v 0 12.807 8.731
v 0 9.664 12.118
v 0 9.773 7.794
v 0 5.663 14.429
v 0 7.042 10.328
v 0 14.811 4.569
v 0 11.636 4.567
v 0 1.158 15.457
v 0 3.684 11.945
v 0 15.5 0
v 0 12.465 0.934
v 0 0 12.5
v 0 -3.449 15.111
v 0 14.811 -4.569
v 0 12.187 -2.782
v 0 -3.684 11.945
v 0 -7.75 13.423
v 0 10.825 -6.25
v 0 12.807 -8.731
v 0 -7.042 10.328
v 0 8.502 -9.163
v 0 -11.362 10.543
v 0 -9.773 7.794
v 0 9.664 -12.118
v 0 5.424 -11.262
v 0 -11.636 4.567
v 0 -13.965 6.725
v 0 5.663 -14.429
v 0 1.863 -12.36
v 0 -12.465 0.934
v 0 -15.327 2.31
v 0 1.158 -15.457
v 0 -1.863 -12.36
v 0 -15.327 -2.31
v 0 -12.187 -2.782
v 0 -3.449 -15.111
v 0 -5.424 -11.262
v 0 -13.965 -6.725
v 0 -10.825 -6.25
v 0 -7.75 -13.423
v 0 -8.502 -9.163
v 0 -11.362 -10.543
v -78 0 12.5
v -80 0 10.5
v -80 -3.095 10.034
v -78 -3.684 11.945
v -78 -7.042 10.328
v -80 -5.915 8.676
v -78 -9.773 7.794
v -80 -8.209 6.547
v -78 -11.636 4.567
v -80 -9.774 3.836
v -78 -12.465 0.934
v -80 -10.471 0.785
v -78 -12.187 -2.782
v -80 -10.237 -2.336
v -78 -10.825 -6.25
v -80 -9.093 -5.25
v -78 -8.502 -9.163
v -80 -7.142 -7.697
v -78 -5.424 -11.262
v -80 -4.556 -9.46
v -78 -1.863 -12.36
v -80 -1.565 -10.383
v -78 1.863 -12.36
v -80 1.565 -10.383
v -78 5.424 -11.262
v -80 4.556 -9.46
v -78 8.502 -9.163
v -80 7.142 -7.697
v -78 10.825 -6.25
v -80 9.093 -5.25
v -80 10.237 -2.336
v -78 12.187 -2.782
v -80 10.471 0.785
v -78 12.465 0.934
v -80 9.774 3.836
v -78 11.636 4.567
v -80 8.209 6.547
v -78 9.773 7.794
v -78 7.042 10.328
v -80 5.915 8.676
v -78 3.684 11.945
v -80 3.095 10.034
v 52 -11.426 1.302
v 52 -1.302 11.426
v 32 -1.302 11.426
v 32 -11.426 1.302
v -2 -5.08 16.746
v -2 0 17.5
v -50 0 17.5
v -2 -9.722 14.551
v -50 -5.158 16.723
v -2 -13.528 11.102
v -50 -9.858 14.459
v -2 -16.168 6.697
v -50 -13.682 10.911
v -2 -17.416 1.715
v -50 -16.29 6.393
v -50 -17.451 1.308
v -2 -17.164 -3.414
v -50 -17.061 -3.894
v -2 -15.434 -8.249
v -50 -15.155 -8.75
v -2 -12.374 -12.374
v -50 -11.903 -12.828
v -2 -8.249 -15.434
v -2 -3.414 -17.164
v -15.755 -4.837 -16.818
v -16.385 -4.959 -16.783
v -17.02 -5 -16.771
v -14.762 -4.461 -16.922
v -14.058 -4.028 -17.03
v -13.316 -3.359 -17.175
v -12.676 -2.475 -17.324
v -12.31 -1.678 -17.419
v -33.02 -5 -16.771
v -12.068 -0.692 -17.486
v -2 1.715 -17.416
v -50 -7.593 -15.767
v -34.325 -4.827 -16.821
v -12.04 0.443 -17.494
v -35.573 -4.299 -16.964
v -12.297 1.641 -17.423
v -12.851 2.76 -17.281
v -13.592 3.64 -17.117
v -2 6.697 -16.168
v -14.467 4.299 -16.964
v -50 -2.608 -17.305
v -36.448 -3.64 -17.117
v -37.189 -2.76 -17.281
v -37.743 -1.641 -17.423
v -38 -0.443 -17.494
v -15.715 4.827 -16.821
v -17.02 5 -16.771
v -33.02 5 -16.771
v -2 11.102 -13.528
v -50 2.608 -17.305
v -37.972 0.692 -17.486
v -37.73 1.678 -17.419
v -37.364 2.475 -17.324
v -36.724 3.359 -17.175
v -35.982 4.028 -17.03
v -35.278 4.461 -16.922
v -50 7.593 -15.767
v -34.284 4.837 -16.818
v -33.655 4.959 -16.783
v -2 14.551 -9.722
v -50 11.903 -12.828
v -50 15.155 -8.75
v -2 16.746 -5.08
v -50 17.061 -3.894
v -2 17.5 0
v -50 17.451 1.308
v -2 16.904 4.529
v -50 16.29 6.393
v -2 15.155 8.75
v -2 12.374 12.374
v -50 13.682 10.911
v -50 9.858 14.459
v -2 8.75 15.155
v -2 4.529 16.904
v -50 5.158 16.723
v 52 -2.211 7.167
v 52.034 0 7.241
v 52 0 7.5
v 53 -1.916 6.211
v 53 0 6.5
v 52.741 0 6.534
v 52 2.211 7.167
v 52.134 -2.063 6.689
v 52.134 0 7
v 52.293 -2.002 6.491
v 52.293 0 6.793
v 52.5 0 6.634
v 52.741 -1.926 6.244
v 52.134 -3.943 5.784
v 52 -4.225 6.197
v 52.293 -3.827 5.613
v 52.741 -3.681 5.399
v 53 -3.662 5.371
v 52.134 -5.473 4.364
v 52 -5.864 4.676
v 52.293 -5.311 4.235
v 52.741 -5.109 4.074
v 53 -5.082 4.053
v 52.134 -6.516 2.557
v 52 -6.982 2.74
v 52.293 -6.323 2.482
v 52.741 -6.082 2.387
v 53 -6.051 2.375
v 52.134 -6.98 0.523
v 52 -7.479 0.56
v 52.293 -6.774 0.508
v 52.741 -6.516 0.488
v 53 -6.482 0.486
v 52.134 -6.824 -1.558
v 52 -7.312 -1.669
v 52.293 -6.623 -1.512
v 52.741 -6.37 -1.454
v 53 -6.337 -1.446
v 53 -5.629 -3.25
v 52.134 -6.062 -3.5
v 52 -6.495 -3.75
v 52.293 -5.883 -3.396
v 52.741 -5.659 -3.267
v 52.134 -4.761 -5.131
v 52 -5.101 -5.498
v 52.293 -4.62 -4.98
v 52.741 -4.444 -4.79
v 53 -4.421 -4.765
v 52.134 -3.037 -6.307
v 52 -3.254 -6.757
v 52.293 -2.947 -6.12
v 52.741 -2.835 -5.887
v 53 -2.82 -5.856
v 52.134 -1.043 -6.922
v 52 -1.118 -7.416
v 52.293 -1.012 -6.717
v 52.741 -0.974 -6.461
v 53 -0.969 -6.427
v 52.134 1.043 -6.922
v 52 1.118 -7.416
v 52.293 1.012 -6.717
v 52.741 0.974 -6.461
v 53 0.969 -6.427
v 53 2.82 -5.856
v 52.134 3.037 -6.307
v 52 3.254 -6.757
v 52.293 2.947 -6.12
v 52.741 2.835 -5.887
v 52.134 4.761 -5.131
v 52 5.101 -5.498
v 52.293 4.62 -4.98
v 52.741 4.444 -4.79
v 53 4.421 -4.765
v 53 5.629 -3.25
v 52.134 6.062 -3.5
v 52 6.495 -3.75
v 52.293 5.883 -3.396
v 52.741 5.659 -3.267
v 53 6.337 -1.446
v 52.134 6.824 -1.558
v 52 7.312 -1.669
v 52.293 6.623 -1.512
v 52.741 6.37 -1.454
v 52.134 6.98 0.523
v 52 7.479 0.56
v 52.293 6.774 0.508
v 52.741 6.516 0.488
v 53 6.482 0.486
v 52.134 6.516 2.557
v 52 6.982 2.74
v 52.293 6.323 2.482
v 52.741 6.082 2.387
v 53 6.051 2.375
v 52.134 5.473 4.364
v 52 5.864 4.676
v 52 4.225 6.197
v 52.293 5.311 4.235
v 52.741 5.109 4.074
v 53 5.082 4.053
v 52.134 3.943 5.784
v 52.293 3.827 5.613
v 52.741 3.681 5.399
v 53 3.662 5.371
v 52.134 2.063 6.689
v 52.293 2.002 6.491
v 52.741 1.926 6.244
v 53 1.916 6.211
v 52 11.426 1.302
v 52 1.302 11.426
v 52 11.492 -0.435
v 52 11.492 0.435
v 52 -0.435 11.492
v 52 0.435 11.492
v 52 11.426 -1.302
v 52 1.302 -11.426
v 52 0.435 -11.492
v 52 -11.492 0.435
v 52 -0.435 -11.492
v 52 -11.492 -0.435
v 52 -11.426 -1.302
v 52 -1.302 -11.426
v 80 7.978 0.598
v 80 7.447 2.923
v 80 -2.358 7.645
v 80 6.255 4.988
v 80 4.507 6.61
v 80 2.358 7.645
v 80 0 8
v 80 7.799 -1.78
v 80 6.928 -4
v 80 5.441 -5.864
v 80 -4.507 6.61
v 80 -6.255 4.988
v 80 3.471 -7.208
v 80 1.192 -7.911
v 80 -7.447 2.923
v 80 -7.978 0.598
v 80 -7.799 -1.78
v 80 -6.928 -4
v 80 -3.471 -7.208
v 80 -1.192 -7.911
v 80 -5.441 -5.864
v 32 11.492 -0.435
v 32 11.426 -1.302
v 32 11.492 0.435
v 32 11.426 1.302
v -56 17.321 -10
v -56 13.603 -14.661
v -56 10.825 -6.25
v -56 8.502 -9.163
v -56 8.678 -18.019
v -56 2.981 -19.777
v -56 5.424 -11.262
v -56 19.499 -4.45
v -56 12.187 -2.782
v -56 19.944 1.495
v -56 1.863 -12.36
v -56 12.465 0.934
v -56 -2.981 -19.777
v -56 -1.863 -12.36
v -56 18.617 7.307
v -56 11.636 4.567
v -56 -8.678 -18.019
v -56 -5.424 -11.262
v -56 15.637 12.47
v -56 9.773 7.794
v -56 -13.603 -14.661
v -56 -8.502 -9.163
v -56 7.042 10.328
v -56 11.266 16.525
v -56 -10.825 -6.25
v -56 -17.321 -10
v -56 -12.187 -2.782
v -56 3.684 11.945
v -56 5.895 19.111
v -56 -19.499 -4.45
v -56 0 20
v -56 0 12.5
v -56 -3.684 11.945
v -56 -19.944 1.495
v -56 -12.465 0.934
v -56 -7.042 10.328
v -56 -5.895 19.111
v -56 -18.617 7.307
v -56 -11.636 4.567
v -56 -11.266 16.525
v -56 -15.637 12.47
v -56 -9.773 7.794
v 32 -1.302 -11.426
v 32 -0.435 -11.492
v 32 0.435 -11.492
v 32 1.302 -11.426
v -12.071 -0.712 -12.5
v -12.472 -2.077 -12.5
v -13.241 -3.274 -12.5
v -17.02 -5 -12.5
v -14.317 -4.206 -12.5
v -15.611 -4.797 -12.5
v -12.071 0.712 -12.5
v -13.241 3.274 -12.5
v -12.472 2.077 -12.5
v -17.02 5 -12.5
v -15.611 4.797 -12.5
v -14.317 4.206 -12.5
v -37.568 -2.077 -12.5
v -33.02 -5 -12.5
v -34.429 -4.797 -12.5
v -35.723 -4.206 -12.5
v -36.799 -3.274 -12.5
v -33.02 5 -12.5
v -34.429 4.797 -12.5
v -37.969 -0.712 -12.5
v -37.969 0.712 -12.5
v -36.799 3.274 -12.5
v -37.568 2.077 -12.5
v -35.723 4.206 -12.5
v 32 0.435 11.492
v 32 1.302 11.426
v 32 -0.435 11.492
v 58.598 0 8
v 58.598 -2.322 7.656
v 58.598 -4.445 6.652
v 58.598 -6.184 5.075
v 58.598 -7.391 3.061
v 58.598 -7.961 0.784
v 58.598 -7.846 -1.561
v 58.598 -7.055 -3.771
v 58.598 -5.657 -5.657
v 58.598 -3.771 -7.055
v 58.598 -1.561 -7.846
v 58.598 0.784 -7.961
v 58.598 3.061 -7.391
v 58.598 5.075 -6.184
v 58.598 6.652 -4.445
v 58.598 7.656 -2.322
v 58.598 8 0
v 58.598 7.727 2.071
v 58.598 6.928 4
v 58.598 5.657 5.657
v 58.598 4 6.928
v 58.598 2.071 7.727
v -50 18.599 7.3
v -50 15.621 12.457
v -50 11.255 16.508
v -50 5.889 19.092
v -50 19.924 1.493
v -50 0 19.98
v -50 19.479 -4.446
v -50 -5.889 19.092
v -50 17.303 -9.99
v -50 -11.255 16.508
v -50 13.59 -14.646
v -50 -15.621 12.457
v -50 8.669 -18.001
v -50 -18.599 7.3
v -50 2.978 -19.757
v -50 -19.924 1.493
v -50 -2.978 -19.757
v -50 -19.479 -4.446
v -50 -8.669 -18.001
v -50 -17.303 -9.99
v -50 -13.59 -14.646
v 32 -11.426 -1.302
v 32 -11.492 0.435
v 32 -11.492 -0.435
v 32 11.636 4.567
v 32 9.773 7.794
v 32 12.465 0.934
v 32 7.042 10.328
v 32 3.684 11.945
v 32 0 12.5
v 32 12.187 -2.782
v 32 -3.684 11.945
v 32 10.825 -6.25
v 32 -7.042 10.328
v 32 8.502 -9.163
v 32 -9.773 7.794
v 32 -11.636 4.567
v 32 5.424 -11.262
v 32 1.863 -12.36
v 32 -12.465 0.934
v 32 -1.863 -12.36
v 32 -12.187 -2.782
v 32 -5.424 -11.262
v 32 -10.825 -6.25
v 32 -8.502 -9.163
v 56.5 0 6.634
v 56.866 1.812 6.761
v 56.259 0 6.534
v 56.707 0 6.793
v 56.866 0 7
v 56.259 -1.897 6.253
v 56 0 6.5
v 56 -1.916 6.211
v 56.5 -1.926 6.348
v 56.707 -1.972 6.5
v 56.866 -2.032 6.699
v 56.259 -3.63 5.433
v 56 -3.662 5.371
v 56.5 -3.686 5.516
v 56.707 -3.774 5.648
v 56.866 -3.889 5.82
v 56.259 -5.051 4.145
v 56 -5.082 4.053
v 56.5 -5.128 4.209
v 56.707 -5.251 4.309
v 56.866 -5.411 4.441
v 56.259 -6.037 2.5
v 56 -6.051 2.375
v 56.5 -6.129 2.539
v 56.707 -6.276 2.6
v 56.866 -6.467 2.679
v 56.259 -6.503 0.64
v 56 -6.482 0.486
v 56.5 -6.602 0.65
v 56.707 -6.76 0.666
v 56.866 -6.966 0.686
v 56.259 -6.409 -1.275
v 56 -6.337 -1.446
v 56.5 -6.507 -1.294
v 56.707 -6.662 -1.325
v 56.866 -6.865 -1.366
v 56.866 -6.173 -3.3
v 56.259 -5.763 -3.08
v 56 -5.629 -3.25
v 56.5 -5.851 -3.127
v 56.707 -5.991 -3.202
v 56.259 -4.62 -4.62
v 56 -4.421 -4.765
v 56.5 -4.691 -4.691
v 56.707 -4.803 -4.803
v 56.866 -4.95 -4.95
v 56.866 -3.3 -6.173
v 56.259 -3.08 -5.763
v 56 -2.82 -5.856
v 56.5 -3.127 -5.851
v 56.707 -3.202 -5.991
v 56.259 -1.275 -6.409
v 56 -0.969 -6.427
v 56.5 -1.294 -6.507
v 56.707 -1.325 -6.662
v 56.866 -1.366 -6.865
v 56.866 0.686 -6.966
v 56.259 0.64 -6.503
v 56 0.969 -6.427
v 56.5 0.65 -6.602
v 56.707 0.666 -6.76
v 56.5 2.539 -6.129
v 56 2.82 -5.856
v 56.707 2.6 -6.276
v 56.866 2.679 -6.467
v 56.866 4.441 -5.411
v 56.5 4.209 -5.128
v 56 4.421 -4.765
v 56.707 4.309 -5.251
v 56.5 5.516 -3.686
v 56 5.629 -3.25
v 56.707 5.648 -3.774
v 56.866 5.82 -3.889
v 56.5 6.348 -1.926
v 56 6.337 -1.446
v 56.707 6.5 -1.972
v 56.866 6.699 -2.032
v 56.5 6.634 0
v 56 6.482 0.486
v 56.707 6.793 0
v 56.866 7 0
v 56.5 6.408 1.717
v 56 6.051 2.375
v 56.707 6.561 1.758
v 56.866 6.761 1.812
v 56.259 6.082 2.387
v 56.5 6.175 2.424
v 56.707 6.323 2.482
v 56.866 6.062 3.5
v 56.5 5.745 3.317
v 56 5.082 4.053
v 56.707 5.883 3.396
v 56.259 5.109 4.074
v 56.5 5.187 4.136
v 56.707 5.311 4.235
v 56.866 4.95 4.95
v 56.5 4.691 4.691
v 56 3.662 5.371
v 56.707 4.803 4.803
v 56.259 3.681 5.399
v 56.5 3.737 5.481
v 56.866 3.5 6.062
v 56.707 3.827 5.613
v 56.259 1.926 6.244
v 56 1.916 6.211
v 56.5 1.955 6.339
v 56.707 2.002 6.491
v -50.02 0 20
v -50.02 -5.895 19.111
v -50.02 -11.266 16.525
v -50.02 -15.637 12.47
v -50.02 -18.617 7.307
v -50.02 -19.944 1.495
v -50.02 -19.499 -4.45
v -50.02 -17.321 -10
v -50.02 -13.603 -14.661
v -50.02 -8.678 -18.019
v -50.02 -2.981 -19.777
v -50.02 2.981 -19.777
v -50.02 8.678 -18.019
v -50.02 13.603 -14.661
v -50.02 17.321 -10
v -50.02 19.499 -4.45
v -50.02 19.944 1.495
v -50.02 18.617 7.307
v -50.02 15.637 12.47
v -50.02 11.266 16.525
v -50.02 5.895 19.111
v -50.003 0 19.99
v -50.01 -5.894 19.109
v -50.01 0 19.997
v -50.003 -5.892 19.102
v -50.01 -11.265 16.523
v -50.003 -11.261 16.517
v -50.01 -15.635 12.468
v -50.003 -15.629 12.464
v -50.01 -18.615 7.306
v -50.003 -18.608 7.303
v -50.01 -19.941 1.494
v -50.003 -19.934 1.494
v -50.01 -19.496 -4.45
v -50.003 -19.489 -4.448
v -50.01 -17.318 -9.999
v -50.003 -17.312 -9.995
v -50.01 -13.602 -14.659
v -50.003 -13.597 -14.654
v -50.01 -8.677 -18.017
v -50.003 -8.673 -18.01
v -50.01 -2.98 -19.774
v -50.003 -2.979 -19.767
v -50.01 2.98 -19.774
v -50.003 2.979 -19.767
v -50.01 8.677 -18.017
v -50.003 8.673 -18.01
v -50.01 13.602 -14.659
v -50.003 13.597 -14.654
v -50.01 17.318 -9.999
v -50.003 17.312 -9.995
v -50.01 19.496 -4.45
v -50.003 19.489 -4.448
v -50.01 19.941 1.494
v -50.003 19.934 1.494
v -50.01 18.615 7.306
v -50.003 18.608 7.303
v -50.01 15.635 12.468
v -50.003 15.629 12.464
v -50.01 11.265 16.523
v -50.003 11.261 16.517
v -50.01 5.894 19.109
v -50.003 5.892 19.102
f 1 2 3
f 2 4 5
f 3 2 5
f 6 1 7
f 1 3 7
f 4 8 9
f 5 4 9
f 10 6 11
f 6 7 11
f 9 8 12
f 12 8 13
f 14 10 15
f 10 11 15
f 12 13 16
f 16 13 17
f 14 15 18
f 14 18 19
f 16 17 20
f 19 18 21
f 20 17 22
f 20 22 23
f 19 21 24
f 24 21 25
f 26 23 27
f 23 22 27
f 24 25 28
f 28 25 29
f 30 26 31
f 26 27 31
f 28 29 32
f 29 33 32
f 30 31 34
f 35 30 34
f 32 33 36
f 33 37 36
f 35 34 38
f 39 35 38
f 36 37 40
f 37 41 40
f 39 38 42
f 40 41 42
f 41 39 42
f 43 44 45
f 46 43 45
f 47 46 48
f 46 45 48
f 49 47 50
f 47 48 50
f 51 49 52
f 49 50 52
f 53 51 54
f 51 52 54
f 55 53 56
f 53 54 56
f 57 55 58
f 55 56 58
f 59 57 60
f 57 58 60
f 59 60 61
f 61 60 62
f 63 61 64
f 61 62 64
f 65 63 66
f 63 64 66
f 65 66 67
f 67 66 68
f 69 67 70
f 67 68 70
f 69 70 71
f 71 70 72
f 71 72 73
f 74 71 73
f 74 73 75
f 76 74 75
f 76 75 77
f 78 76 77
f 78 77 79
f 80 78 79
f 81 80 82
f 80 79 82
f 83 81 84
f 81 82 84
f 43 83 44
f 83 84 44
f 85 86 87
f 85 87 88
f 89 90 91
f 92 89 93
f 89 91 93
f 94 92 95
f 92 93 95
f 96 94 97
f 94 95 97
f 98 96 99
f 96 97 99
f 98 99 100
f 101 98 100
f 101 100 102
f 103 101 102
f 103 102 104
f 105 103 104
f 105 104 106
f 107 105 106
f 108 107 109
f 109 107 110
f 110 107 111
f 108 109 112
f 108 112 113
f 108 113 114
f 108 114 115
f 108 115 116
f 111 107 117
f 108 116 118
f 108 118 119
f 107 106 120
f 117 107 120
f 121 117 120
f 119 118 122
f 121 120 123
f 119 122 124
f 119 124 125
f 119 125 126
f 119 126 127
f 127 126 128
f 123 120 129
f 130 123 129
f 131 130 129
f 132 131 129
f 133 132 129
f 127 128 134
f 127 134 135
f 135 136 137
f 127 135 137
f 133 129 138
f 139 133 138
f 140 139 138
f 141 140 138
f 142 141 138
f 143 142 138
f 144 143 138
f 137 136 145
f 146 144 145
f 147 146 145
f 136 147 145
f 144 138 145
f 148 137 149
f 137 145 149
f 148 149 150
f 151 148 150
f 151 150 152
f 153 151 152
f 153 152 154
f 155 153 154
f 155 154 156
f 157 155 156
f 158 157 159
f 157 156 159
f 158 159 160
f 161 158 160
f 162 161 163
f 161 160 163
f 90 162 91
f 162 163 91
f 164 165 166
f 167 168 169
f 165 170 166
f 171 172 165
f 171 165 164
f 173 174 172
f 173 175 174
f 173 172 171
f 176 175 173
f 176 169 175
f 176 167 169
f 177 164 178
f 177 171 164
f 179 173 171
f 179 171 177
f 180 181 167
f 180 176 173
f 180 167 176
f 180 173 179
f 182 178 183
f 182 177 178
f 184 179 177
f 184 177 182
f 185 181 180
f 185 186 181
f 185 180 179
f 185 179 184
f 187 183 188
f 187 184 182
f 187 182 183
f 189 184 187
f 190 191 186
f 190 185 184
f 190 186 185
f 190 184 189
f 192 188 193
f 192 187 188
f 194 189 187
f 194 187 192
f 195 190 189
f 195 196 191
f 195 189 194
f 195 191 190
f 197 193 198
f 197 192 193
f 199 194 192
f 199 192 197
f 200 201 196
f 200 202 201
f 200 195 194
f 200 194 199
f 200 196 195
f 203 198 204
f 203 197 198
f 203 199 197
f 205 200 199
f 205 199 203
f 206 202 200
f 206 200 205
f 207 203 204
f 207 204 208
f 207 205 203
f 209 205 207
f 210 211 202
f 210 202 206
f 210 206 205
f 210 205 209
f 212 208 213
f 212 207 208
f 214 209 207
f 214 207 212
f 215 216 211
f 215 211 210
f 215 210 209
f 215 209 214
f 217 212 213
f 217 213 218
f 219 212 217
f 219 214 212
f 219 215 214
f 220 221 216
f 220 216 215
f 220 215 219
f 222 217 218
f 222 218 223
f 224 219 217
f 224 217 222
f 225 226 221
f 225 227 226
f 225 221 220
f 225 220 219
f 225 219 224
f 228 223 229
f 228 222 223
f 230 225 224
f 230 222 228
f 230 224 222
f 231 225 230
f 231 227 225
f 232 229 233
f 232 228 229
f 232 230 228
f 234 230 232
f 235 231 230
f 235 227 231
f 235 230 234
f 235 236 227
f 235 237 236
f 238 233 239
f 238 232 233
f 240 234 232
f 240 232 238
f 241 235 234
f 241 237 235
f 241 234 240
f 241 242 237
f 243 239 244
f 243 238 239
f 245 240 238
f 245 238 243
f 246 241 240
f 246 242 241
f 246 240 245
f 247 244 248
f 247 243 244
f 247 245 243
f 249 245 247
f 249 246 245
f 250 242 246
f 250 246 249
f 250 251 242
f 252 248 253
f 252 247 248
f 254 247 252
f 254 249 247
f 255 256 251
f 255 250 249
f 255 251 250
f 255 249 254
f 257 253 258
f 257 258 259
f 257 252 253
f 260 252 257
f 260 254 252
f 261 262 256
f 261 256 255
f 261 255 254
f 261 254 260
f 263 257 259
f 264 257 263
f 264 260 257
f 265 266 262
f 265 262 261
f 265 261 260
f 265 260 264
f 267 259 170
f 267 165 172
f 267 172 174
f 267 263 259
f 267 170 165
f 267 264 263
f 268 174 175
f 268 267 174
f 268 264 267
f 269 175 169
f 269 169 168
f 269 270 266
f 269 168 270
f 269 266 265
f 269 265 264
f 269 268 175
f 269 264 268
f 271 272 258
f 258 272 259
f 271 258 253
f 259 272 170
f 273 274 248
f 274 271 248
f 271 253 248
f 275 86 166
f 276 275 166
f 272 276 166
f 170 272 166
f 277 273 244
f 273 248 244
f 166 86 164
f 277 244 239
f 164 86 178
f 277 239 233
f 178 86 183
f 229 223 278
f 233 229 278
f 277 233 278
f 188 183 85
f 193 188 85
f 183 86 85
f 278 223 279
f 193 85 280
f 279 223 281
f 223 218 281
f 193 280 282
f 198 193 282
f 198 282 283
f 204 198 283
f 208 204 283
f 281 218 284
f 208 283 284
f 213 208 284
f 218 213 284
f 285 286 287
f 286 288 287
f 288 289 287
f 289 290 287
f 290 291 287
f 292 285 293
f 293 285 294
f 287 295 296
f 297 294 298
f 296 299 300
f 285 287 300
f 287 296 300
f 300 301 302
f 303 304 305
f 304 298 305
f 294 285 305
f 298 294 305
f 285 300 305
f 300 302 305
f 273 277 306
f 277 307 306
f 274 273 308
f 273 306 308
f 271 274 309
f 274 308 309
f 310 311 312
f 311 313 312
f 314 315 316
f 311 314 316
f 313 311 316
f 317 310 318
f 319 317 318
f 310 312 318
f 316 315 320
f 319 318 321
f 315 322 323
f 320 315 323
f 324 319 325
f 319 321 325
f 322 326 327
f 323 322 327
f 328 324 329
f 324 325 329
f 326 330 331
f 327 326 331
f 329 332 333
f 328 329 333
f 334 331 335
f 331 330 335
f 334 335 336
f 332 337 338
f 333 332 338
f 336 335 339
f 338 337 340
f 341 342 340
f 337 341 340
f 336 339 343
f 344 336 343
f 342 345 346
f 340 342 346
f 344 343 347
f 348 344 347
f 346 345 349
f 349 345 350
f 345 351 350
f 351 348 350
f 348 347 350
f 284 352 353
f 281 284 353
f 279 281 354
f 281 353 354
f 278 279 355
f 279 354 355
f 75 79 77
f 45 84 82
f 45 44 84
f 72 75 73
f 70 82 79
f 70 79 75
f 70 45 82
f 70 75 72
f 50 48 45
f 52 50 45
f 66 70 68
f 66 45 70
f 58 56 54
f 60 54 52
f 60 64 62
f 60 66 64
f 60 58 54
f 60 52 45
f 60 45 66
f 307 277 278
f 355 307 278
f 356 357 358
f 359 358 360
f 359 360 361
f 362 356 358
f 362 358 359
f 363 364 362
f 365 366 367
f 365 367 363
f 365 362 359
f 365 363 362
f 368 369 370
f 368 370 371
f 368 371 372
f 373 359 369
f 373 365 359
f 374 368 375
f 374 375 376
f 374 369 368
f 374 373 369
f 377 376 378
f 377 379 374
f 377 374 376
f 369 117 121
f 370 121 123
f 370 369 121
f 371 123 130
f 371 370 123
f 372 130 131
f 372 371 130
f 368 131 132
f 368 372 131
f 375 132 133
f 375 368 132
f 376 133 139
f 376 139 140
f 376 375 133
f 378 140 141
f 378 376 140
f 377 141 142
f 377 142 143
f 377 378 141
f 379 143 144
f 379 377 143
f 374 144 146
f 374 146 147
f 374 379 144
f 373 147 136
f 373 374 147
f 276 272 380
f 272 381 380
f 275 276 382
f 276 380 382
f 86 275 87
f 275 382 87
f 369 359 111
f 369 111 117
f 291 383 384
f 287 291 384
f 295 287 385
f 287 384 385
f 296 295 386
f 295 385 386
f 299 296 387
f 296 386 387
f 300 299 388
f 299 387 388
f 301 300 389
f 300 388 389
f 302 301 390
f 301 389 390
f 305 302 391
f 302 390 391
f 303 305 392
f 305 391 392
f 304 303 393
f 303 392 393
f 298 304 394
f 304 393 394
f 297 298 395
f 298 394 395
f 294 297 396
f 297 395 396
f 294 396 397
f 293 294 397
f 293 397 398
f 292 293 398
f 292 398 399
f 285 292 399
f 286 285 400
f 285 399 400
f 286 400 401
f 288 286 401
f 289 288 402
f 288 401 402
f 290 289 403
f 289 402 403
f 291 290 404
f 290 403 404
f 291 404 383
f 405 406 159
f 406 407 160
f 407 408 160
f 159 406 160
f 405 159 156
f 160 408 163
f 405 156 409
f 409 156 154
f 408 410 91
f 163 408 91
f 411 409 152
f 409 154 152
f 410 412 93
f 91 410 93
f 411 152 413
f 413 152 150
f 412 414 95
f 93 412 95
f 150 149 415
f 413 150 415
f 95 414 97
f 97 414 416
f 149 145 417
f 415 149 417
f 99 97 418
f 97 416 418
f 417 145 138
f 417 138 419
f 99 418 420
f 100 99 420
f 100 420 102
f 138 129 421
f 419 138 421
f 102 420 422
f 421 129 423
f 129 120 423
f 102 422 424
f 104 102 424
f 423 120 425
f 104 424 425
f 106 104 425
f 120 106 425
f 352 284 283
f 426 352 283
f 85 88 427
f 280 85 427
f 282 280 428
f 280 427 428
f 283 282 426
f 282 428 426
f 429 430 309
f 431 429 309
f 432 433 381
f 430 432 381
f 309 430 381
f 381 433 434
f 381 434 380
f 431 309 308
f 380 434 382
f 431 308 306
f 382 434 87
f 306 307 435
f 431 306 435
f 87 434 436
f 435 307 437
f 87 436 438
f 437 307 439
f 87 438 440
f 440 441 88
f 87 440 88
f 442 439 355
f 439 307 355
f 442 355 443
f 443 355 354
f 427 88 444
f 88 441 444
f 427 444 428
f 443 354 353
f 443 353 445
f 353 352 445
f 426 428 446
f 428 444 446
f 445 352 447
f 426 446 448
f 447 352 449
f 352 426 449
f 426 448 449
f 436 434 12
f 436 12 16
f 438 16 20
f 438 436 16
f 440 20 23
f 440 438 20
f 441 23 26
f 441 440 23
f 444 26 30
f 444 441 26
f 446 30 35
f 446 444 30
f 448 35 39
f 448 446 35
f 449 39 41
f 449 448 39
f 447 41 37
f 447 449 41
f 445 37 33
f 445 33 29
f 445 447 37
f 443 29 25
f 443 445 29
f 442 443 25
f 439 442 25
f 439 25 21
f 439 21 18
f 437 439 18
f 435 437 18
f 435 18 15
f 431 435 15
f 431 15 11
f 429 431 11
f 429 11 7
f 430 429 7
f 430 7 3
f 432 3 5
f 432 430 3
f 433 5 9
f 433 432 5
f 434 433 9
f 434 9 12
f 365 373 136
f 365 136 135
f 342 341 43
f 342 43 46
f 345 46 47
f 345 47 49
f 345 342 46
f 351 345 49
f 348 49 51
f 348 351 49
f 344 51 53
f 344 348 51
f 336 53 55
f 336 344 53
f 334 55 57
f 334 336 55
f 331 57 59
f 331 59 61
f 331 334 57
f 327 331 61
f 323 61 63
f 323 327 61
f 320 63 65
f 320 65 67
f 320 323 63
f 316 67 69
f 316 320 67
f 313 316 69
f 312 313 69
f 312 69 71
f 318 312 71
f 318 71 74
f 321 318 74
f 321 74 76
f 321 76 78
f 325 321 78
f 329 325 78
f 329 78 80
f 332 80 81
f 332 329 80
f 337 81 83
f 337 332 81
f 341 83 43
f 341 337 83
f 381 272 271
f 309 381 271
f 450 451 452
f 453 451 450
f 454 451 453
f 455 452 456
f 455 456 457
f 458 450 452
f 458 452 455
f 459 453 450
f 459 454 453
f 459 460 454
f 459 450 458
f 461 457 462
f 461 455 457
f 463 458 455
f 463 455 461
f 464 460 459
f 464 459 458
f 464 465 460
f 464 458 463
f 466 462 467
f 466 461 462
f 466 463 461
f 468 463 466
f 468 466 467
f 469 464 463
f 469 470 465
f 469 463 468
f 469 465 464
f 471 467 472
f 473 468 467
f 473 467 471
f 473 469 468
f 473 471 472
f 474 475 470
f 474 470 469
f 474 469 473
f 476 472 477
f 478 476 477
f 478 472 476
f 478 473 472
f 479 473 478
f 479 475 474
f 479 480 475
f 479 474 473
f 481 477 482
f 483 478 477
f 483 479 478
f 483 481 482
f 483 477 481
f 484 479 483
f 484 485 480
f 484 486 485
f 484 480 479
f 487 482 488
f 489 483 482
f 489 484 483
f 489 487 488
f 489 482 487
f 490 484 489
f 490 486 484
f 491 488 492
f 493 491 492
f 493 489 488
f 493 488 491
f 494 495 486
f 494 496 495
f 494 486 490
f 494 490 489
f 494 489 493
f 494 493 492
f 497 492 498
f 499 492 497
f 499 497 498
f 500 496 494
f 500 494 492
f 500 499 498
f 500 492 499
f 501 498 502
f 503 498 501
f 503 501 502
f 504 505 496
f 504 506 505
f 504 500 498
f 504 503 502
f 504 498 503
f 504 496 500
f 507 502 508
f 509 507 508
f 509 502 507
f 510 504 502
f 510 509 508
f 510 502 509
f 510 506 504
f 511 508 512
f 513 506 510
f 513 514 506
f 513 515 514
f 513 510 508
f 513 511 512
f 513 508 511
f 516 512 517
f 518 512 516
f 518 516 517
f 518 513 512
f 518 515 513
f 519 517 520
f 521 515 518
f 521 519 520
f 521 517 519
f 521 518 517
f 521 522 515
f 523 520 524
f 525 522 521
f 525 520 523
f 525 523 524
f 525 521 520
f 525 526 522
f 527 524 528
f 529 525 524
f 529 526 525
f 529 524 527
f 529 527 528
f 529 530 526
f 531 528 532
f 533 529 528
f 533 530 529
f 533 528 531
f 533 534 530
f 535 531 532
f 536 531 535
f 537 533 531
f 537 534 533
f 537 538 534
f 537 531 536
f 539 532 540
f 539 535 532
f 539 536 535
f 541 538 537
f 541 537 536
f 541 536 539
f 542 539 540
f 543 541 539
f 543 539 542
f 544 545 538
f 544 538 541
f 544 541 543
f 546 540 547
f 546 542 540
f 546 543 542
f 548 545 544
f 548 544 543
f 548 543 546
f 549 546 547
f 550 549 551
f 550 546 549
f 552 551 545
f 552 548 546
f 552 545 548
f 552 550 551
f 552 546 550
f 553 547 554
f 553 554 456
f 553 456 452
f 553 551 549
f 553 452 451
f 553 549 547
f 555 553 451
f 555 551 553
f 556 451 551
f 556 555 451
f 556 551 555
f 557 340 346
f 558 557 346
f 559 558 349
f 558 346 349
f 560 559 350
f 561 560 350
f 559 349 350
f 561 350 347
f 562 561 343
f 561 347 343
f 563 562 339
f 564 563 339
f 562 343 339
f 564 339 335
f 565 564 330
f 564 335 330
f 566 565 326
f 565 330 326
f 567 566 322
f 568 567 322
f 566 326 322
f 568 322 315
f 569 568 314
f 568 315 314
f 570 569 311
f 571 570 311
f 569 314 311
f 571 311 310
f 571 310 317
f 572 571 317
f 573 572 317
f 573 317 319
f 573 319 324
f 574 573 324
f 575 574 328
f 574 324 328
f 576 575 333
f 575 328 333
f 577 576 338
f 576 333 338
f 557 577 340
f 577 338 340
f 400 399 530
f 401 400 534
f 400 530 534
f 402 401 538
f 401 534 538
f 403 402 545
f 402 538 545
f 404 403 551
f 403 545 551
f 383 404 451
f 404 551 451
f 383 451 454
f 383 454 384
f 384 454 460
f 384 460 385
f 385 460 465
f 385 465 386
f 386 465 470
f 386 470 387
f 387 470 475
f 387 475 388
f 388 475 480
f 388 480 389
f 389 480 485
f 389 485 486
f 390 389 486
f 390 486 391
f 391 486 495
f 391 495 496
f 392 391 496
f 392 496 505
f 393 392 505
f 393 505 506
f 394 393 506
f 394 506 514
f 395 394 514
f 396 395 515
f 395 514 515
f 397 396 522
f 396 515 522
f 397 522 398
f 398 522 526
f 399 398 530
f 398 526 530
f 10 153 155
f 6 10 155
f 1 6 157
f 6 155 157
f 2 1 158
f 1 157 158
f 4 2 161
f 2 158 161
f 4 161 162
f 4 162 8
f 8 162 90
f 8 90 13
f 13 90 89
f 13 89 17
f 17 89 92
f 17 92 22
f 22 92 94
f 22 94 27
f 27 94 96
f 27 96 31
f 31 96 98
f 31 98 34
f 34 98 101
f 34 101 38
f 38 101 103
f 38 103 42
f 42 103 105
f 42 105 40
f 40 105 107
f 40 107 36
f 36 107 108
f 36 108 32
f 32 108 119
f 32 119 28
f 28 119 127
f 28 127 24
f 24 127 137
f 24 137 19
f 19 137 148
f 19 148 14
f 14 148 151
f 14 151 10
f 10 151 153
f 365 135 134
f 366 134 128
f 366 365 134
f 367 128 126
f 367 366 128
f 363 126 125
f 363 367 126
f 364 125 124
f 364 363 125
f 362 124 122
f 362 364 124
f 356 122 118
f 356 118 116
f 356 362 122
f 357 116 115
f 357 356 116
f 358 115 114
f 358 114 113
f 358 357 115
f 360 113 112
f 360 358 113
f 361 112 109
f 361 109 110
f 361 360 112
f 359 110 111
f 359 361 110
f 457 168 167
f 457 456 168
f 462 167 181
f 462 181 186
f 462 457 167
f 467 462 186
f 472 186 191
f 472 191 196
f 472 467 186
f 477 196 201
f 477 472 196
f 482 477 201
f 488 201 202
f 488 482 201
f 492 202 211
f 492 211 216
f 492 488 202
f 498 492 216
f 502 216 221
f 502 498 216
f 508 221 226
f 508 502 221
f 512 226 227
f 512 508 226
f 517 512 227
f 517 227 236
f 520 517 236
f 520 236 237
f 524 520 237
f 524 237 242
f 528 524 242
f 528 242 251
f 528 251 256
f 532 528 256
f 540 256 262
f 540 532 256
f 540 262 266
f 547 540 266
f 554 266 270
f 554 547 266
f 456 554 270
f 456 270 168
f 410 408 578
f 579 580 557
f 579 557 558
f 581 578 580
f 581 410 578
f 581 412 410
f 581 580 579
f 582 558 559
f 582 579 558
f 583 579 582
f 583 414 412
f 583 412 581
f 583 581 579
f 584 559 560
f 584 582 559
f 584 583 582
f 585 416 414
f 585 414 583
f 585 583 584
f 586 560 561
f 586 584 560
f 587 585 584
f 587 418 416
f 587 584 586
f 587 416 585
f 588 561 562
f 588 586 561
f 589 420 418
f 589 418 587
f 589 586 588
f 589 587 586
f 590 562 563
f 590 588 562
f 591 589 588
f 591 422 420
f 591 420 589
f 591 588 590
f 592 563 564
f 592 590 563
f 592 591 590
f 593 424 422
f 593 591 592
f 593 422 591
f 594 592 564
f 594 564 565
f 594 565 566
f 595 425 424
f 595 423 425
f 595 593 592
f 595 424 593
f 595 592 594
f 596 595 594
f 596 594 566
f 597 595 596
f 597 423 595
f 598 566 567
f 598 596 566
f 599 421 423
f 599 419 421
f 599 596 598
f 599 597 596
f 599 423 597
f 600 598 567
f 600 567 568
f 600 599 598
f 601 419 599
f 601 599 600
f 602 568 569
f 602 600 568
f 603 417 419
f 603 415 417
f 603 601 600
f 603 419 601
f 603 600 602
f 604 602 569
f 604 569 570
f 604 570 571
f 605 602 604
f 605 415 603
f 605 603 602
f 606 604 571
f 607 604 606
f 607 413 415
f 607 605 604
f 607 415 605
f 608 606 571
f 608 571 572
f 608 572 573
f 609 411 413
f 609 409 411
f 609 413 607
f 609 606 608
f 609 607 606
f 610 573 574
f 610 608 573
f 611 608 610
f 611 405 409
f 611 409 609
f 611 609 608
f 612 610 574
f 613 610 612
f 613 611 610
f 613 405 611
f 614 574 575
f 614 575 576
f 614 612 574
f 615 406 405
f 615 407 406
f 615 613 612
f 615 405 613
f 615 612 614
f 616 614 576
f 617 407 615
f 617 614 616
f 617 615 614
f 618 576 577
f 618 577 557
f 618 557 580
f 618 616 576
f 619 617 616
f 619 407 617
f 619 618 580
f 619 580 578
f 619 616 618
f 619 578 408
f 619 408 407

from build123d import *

# Parameters (mm, degrees)
SKETCH_2_W          = 24
SKETCH_2_H          = 12.5
SKETCH_2_W_2        = 32
FILLET_2_R          = 0.02
CUT_EXTRUDE_1_DEPTH = 20
CUT_EXTRUDE_2_DEPTH = 20
EXTRUDE_2_DEPTH     = 12.5
CHAMFER_3_SIZE      = 2


with BuildPart() as part:
    # 草图2 → 旋转1 (revolve)
    with BuildSketch(Plane(origin=(0, 0, 0), x_dir=(1, 0, 0), z_dir=(0, 1, 0)), mode=Mode.PRIVATE) as revolve_1_sk:
        with Locations((-68, 6.25)):
            Rectangle(SKETCH_2_W, SKETCH_2_H)
        Polygon((-56, 0), (-50, 0), (-50, 17.5), (-50, 20), (-56, 20), (-56, 12.5), align=None)
        Polygon((-50, 0), (0, 0), (0, 12.5), (0, 17.5), (-50, 17.5), align=None)
        with Locations((16, 6.25)):
            Rectangle(SKETCH_2_W_2, SKETCH_2_H)
        Polygon((52, 0), (52, 7.5), (52, 11.5), (32, 11.5), (32, 0), align=None)
        with BuildLine():
            ThreePointArc((56, 6.5), (56.707106781, 6.792893219), (57, 7.5))
            Line((57, 7.5), (57, 0))
            Line((57, 0), (52, 0))
            Line((52, 0), (52, 7.5))
            ThreePointArc((52, 7.5), (52.292893219, 6.792893219), (53, 6.5))
            Line((53, 6.5), (56, 6.5))
        make_face()
        Polygon((57, 8), (57, 7.5), (57, 0), (80, 0), (80, 8), align=None)
    revolve(revolve_1_sk.sketch.rotate(Axis((-92.921580587, 0, 0), (1, 0, 0)), 180), axis=Axis((-92.921580587, 0, 0), (1, 0, 0)))

    # 倒角2: read off the stored shape, not the designer's step
    # 倒角2 outline → 倒角2 (revolve, cut)
    with BuildSketch(Plane.YX):
        Polygon((7, 56.866025404), (7.5, 56.866025404), (7.5, 57), (8, 57), (8, 58.598076211), align=None)
        Polygon((17.5, 0), (15.5, 0), (17.5, -2), align=None)
    revolve(axis=Axis((0, 0, 0), (1, 0, 0)), mode=Mode.SUBTRACT)

    # 圆角2
    fillet_2_edges = [part.edges().sort_by_distance(p)[0] for p in [
        (-50, 0, -20),
    ]]
    fillet(fillet_2_edges, radius=FILLET_2_R)

    # 草图3 → 切除-拉伸1 (cut)
    with BuildSketch(Plane(origin=(52, 0, 0), x_dir=(0, 0, -1), z_dir=(1, 0, 0))):
        Polygon((13.451018428, -3.326790062), (11.426075214, -1.301846848), (1.301846848, -11.426075214), (3.326790062, -13.451018428), align=None)
        Polygon((1.301846848, 11.426075214), (11.426075214, 1.301846848), (13.451018428, 3.326790062), (3.326790062, 13.451018428), align=None)
        Polygon((-13.451018428, 3.326790062), (-11.426075214, 1.301846848), (-1.301846848, 11.426075214), (-3.326790062, 13.451018428), align=None)
        Polygon((-1.301846848, -11.426075214), (-3.326790062, -13.451018428), (-13.451018428, -3.326790062), (-11.426075214, -1.301846848), align=None)
    extrude(amount=-CUT_EXTRUDE_1_DEPTH, mode=Mode.SUBTRACT)

    # 草图5 → 切除-拉伸2 (cut)
    with BuildSketch(Plane.XY):
        with BuildLine():
            Line((-33.02, 5), (-17.02, 5))
            ThreePointArc((-17.02, 5), (-12.02, 0), (-17.02, -5))
            Line((-17.02, -5), (-33.02, -5))
            ThreePointArc((-33.02, -5), (-38.02, 0), (-33.02, 5))
        make_face()
    extrude(amount=-CUT_EXTRUDE_2_DEPTH, mode=Mode.SUBTRACT)

    # 草图4 → 凸台-拉伸2 (add)
    with BuildSketch(Plane.XY):
        with BuildLine():
            Line((-33.02, 5), (-17.02, 5))
            ThreePointArc((-17.02, 5), (-12.02, 0), (-17.02, -5))
            Line((-17.02, -5), (-33.02, -5))
            ThreePointArc((-33.02, -5), (-38.02, 0), (-33.02, 5))
        make_face()
    extrude(amount=-EXTRUDE_2_DEPTH)

    # 倒角3
    chamfer_3_edges = [part.edges().sort_by_distance(p)[0] for p in [
        (-80, 0, -12.5),
    ]]
    chamfer(chamfer_3_edges, length=CHAMFER_3_SIZE)


solid = part.part
